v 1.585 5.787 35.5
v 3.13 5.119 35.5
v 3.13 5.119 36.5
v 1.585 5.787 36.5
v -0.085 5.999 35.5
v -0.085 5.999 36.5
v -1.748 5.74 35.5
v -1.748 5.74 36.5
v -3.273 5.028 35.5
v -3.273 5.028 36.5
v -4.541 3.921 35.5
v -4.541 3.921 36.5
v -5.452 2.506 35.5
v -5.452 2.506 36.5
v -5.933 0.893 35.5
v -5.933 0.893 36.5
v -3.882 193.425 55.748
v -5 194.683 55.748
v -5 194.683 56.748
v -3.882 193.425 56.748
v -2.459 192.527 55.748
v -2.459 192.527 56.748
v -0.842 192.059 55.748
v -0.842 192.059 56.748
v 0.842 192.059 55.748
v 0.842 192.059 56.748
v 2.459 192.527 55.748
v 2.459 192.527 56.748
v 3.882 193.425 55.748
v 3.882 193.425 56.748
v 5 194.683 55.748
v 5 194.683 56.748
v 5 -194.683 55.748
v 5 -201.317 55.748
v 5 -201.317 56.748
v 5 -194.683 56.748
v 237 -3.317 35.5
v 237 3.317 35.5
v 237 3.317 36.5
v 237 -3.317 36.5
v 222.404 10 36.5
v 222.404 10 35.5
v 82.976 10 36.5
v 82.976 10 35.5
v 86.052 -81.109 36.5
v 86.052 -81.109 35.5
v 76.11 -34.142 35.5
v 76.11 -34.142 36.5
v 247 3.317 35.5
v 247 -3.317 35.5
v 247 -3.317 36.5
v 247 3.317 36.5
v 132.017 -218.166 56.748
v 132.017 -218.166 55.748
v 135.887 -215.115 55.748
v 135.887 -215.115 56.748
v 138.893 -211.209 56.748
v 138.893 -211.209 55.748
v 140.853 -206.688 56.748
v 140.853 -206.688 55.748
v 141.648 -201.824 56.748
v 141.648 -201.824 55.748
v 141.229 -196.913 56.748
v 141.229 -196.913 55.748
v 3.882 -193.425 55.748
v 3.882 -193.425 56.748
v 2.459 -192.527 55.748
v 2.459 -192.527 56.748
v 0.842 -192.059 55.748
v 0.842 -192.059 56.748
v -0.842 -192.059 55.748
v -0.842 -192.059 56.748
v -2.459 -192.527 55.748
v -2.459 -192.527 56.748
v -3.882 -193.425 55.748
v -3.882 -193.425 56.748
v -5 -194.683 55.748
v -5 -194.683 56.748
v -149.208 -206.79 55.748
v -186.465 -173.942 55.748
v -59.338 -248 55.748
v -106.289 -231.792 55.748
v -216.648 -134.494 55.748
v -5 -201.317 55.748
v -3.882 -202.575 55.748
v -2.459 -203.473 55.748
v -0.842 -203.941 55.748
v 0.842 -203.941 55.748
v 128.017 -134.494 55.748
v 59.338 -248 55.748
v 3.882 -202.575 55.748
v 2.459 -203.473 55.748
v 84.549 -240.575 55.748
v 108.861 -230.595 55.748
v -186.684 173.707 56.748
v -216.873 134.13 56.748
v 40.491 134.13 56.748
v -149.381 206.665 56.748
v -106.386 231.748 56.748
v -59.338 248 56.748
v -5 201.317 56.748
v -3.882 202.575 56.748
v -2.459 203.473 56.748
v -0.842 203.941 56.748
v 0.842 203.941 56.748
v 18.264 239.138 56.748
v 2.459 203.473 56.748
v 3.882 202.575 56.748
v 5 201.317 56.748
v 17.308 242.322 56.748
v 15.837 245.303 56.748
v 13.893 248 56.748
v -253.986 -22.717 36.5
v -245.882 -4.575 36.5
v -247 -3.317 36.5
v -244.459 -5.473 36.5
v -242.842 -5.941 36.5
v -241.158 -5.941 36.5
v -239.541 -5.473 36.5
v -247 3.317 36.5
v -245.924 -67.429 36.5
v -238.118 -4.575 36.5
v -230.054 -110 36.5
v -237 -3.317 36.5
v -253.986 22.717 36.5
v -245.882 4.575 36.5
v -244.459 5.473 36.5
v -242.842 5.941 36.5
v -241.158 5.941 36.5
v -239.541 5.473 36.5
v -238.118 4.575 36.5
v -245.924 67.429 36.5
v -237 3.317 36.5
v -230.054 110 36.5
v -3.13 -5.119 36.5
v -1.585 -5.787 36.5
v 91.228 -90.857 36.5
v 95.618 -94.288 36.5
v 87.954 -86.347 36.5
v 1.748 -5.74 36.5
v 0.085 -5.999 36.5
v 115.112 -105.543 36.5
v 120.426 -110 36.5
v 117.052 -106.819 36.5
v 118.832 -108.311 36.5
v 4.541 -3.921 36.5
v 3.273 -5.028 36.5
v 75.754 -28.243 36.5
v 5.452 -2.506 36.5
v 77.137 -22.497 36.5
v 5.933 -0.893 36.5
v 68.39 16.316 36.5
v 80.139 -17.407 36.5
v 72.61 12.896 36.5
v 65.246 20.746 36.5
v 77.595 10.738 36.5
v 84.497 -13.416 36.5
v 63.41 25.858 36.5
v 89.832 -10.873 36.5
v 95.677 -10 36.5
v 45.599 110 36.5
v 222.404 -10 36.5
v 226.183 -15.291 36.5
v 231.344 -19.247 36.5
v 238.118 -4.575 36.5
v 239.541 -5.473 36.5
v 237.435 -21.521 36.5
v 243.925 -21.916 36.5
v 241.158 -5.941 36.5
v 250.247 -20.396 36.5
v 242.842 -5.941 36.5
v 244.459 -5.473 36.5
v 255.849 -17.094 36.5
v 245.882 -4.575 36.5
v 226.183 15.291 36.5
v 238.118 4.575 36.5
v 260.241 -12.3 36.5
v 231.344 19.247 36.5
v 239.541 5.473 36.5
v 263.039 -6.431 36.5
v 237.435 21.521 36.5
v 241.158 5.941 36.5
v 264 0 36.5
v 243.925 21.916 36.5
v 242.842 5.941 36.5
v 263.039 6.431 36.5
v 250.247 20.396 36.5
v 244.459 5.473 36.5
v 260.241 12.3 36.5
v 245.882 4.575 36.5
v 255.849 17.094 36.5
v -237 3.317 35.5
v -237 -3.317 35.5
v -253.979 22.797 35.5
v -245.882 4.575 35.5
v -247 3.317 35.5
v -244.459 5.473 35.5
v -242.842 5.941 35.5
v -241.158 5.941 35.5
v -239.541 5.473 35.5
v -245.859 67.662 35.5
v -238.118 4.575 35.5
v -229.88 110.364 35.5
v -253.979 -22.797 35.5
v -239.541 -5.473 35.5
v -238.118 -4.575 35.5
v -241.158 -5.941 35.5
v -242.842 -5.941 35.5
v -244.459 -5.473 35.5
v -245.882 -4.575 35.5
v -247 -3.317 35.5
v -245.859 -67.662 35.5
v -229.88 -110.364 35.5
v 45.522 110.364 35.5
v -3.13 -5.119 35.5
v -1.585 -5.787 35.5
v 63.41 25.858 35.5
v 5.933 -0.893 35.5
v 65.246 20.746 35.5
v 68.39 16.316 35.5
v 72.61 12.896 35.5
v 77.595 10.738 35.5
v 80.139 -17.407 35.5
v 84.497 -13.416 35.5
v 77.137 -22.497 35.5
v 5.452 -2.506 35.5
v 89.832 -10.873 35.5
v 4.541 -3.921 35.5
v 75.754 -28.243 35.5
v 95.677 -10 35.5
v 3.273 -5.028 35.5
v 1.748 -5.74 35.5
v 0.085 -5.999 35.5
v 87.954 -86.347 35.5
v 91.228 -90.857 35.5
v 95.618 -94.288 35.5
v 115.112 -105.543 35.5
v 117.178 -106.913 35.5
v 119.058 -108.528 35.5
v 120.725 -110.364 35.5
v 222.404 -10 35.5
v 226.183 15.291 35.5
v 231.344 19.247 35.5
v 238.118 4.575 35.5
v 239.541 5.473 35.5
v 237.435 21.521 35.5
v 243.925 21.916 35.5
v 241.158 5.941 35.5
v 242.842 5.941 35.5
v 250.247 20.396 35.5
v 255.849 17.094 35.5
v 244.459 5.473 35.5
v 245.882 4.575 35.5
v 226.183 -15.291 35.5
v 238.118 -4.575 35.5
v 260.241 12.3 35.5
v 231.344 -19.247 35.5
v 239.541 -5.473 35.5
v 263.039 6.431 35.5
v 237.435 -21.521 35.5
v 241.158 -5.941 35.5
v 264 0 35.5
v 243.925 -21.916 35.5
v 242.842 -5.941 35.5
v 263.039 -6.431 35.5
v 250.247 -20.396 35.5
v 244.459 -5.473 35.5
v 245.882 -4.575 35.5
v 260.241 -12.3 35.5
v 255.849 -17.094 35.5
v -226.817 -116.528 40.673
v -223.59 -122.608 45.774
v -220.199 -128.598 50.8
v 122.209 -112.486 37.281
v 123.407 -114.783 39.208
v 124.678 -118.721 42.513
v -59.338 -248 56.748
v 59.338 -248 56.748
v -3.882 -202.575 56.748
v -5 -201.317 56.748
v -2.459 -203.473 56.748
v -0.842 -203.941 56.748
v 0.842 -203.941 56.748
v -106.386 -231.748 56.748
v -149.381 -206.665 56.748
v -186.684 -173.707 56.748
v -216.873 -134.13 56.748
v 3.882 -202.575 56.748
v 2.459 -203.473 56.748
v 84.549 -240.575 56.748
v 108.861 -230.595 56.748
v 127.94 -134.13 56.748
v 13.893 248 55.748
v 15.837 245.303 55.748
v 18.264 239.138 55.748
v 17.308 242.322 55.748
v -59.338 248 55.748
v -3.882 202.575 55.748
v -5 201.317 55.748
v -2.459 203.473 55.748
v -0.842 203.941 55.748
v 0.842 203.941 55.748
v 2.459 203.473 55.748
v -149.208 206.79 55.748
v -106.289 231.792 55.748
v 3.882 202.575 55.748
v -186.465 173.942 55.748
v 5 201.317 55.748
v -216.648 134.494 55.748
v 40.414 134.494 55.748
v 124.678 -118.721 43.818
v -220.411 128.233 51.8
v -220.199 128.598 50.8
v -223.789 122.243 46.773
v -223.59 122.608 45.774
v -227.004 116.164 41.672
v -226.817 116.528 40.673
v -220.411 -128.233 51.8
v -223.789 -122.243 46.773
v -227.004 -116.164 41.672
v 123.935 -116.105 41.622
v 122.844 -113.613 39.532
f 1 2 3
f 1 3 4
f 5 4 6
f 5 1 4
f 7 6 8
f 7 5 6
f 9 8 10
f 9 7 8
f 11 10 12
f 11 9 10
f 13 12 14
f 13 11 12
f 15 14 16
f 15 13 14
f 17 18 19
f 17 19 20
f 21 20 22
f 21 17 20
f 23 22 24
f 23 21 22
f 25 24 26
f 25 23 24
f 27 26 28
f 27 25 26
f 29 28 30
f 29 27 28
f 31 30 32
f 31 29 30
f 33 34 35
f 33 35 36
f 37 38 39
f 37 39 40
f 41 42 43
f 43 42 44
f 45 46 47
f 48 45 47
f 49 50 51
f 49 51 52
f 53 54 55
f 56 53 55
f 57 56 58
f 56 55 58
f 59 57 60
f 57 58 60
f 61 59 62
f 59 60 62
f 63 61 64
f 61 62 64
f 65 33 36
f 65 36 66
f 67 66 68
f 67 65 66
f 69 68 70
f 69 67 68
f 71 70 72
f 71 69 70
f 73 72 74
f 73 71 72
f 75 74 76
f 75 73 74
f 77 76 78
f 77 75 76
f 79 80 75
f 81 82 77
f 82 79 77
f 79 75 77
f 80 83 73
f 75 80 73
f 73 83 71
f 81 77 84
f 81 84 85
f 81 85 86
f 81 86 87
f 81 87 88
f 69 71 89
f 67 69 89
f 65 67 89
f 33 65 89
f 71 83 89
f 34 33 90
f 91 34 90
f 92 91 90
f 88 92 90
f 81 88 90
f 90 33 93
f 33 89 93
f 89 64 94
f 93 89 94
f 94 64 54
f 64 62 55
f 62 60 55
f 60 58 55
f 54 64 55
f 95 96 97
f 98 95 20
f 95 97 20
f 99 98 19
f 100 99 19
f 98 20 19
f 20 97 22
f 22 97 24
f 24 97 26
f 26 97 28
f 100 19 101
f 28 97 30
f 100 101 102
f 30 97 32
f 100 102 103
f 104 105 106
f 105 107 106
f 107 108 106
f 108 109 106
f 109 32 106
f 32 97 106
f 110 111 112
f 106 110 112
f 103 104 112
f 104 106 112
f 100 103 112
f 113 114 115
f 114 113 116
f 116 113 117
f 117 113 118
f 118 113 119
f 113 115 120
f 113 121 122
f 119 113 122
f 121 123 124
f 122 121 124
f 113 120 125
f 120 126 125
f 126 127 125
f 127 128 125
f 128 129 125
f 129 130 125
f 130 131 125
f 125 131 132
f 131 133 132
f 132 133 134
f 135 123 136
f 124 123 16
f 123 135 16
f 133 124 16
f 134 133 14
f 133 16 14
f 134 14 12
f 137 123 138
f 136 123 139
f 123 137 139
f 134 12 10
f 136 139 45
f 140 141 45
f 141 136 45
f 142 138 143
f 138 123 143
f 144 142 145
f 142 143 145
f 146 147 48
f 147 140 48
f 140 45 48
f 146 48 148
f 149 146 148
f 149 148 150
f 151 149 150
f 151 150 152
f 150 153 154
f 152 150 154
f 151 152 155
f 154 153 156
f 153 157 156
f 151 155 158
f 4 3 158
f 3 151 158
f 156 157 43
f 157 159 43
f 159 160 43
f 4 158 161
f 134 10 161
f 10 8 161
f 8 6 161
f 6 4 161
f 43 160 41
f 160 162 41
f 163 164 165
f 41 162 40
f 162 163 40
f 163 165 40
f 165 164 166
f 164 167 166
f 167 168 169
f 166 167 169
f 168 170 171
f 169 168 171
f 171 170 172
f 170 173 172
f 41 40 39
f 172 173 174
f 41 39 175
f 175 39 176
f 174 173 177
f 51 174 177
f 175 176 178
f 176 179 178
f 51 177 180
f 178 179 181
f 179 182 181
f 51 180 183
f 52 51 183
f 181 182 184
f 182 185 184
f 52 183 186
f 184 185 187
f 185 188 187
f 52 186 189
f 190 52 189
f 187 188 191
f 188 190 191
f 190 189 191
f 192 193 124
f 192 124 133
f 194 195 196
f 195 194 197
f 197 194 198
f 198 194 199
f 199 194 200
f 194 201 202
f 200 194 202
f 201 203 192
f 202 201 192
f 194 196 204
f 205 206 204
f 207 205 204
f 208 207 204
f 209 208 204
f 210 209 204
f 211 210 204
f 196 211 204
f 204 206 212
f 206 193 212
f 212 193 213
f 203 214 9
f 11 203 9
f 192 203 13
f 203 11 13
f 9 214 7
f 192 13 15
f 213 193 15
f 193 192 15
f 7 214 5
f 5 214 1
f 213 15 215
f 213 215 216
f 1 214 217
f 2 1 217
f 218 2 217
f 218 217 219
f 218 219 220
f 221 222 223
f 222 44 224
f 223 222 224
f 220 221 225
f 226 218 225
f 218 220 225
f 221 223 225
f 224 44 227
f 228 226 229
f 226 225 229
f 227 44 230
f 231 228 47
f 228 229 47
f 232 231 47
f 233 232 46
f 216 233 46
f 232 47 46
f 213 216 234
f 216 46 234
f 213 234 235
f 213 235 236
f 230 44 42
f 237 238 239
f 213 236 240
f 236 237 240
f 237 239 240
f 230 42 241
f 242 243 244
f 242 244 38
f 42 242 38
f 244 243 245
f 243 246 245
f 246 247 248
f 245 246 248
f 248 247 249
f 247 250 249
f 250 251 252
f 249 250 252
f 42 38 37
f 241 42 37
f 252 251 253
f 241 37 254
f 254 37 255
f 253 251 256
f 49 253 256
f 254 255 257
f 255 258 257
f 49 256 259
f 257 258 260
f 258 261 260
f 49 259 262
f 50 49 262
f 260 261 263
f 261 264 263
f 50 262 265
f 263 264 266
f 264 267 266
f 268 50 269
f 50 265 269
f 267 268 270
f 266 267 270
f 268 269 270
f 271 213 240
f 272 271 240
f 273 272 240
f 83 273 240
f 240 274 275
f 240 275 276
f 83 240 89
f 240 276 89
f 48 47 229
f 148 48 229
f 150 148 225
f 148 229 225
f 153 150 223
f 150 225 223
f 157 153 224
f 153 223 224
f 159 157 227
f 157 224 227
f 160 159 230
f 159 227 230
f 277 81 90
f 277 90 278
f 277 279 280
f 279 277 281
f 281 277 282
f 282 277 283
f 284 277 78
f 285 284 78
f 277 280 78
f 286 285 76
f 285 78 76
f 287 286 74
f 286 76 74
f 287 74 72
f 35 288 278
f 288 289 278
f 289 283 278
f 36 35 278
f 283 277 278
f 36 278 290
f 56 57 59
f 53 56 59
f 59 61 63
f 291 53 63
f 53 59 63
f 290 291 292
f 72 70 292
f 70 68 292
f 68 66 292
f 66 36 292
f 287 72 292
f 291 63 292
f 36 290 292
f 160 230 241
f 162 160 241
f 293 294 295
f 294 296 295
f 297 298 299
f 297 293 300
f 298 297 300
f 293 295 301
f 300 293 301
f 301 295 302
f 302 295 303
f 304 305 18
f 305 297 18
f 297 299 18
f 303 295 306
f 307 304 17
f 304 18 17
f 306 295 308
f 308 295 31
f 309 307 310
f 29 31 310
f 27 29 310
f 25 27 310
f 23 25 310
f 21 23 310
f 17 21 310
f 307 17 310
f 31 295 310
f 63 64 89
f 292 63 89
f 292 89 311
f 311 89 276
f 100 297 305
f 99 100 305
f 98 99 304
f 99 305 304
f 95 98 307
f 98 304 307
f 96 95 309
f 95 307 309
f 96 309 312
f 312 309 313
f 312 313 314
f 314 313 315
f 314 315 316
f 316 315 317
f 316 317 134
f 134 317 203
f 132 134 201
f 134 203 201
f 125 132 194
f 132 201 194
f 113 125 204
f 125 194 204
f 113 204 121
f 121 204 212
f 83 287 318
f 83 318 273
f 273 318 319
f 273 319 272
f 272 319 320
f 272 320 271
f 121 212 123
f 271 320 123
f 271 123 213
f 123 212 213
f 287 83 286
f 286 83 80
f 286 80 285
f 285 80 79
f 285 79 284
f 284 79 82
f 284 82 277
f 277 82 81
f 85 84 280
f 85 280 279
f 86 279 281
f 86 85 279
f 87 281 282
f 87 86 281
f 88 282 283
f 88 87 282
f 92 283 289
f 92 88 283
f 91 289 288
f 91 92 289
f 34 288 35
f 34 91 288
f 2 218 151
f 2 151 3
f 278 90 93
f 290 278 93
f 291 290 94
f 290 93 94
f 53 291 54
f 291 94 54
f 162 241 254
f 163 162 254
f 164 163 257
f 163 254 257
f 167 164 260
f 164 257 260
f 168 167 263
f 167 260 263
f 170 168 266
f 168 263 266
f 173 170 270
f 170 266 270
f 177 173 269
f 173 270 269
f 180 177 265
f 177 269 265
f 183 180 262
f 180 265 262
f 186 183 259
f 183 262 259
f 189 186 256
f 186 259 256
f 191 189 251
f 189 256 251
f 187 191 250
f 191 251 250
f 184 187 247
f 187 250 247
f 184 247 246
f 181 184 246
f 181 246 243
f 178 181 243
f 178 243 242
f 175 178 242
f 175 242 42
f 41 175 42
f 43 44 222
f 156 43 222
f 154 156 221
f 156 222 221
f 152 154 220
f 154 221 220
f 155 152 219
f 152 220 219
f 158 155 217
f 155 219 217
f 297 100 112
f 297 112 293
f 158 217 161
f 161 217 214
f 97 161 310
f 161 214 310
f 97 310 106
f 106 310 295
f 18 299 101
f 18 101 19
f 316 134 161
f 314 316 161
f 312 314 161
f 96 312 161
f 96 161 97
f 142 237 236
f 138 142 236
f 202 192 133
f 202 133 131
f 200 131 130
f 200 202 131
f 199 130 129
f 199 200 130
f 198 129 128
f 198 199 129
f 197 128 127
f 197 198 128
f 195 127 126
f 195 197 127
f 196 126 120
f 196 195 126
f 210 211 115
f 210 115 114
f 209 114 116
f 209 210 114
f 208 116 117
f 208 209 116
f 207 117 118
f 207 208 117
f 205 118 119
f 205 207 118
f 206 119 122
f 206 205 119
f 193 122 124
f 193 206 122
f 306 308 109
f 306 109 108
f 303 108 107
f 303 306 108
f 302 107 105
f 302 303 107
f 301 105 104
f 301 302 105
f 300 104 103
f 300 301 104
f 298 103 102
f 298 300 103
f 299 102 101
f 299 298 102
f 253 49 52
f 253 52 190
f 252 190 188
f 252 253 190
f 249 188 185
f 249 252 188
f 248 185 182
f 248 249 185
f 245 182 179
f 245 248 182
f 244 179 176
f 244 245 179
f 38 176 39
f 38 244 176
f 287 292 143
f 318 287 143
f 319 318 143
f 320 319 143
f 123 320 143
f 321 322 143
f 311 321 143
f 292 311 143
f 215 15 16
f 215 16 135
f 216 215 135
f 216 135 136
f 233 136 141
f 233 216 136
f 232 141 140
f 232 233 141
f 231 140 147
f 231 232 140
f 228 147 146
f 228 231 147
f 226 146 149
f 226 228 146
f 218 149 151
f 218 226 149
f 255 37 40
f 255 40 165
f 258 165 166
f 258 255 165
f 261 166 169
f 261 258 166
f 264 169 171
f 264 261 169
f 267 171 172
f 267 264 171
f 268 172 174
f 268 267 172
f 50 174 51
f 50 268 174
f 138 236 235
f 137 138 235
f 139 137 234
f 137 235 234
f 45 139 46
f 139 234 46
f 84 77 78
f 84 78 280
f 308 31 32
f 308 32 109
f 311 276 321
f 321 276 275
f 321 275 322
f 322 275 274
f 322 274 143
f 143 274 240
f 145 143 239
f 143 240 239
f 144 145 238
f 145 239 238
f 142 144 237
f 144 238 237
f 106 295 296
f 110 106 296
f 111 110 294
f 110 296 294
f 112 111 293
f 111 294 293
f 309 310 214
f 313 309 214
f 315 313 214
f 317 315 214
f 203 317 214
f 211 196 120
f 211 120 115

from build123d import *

# Parameters (mm, degrees)
SALIENTE_EXTRUIR1_DEPTH    = 271
CORTAR_EXTRUIR6_DEPTH      = 372.705950862
CORTAR_EXTRUIR6_DEPTH_BACK = 372.705950862
CROQUIS2_W                 = 769.435607064
CROQUIS2_H                 = 651.661171996
CORTAR_EXTRUIR9_DEPTH      = 367.633759911
CORTAR_EXTRUIR9_DEPTH_BACK = 367.633759911


with BuildPart() as part:
    # Croquis1 → Saliente-Extruir1 (new, symmetric)
    with BuildSketch(Plane(origin=(0, 0, 0), x_dir=(0, 0, -1), z_dir=(1, 0, 0))):
        Polygon((-36.5, -110), (-36.5, 110), (-56.747809705, 134.130399958), (-56.747809705, 248), (-55.747809705, 248), (-55.747809705, 134.494370193), (-35.5, 110.363970234), (-35.5, -110.363970234), (-55.747809705, -134.494370193), (-55.747809705, -248), (-56.747809705, -248), (-56.747809705, -134.130399958), align=None)
    extrude(amount=SALIENTE_EXTRUIR1_DEPTH, both=True)

    # Croquis2 → Cortar-Extruir6 (cut, two sides: drawn at the far end of the back side and taken through both)
    with BuildSketch(Plane.XY.offset(-CORTAR_EXTRUIR6_DEPTH_BACK)):
        Rectangle(CROQUIS2_W, CROQUIS2_H)
        with BuildLine():
            ThreePointArc((18.264078831, 239.138091094), (11.247490428, 250.568826506), (-1.413221116, 254.996083903))
            ThreePointArc((-1.413221116, 254.996083903), (-245.428142449, -69.210020185), (132.017150423, -218.166156849))
            ThreePointArc((132.017150423, -218.166156849), (140.013145358, -209.009152502), (141.22932319, -196.913385678))
            Line((141.22932319, -196.913385678), (124.678167335, -118.72145722))
            ThreePointArc((124.678167335, -118.72145722), (121.297013967, -111.114290122), (115.11170826, -105.54264919))
            Line((115.11170826, -105.54264919), (95.618429873, -94.288199666))
            ThreePointArc((95.618429873, -94.288199666), (89.433124166, -88.716558735), (86.051970798, -81.109391636))
            Line((86.051970798, -81.109391636), (76.110157122, -34.141700046))
            ThreePointArc((76.110157122, -34.141700046), (80.139016625, -17.407025787), (95.676616197, -10))
            Line((95.676616197, -10), (222.404082058, -10))
            ThreePointArc((222.404082058, -10), (264, 0), (222.404082058, 10))
            Line((222.404082058, 10), (82.976208739, 10))
            ThreePointArc((82.976208739, 10), (70.383234525, 14.462400428), (63.409749664, 25.858299954))
            Line((63.409749664, 25.858299954), (18.264078831, 239.138091094))
        make_face(mode=Mode.SUBTRACT)
    extrude(amount=CORTAR_EXTRUIR6_DEPTH + CORTAR_EXTRUIR6_DEPTH_BACK, mode=Mode.SUBTRACT)

    # Croquis4 → Cortar-Extruir9 (cut, two sides: drawn at the far end of the back side and taken through both)
    with BuildSketch(Plane.XY.offset(-CORTAR_EXTRUIR9_DEPTH_BACK)):
        with BuildLine():
            Line((-5, 201.31662479), (-5, 194.68337521))
            ThreePointArc((-5, 194.68337521), (0, 192), (5, 194.68337521))
            Line((5, 194.68337521), (5, 201.31662479))
            ThreePointArc((5, 201.31662479), (0, 204), (-5, 201.31662479))
        make_face()
        with BuildLine():
            Line((5, -201.31662479), (5, -194.68337521))
            ThreePointArc((5, -194.68337521), (0, -192), (-5, -194.68337521))
            Line((-5, -194.68337521), (-5, -201.31662479))
            ThreePointArc((-5, -201.31662479), (0, -204), (5, -201.31662479))
        make_face()
        with BuildLine():
            Line((-247, 3.31662479), (-247, -3.31662479))
            ThreePointArc((-247, -3.31662479), (-242, -6), (-237, -3.31662479))
            Line((-237, -3.31662479), (-237, 3.31662479))
            ThreePointArc((-237, 3.31662479), (-242, 6), (-247, 3.31662479))
        make_face()
        with BuildLine():
            Line((237, 3.31662479), (237, -3.31662479))
            ThreePointArc((237, -3.31662479), (242, -6), (247, -3.31662479))
            Line((247, -3.31662479), (247, 3.31662479))
            ThreePointArc((247, 3.31662479), (242, 6), (237, 3.31662479))
        make_face()
        with BuildLine():
            Line((-5.933205139, 0.892791565), (-3.129872731, -5.118974183))
            ThreePointArc((-3.129872731, -5.118974183), (2.53570957, -5.437846722), (5.933205139, -0.892791565))
            Line((5.933205139, -0.892791565), (3.129872731, 5.118974183))
            ThreePointArc((3.129872731, 5.118974183), (-2.53570957, 5.437846722), (-5.933205139, 0.892791565))
        make_face()
    extrude(amount=CORTAR_EXTRUIR9_DEPTH + CORTAR_EXTRUIR9_DEPTH_BACK, mode=Mode.SUBTRACT)


solid = part.part
